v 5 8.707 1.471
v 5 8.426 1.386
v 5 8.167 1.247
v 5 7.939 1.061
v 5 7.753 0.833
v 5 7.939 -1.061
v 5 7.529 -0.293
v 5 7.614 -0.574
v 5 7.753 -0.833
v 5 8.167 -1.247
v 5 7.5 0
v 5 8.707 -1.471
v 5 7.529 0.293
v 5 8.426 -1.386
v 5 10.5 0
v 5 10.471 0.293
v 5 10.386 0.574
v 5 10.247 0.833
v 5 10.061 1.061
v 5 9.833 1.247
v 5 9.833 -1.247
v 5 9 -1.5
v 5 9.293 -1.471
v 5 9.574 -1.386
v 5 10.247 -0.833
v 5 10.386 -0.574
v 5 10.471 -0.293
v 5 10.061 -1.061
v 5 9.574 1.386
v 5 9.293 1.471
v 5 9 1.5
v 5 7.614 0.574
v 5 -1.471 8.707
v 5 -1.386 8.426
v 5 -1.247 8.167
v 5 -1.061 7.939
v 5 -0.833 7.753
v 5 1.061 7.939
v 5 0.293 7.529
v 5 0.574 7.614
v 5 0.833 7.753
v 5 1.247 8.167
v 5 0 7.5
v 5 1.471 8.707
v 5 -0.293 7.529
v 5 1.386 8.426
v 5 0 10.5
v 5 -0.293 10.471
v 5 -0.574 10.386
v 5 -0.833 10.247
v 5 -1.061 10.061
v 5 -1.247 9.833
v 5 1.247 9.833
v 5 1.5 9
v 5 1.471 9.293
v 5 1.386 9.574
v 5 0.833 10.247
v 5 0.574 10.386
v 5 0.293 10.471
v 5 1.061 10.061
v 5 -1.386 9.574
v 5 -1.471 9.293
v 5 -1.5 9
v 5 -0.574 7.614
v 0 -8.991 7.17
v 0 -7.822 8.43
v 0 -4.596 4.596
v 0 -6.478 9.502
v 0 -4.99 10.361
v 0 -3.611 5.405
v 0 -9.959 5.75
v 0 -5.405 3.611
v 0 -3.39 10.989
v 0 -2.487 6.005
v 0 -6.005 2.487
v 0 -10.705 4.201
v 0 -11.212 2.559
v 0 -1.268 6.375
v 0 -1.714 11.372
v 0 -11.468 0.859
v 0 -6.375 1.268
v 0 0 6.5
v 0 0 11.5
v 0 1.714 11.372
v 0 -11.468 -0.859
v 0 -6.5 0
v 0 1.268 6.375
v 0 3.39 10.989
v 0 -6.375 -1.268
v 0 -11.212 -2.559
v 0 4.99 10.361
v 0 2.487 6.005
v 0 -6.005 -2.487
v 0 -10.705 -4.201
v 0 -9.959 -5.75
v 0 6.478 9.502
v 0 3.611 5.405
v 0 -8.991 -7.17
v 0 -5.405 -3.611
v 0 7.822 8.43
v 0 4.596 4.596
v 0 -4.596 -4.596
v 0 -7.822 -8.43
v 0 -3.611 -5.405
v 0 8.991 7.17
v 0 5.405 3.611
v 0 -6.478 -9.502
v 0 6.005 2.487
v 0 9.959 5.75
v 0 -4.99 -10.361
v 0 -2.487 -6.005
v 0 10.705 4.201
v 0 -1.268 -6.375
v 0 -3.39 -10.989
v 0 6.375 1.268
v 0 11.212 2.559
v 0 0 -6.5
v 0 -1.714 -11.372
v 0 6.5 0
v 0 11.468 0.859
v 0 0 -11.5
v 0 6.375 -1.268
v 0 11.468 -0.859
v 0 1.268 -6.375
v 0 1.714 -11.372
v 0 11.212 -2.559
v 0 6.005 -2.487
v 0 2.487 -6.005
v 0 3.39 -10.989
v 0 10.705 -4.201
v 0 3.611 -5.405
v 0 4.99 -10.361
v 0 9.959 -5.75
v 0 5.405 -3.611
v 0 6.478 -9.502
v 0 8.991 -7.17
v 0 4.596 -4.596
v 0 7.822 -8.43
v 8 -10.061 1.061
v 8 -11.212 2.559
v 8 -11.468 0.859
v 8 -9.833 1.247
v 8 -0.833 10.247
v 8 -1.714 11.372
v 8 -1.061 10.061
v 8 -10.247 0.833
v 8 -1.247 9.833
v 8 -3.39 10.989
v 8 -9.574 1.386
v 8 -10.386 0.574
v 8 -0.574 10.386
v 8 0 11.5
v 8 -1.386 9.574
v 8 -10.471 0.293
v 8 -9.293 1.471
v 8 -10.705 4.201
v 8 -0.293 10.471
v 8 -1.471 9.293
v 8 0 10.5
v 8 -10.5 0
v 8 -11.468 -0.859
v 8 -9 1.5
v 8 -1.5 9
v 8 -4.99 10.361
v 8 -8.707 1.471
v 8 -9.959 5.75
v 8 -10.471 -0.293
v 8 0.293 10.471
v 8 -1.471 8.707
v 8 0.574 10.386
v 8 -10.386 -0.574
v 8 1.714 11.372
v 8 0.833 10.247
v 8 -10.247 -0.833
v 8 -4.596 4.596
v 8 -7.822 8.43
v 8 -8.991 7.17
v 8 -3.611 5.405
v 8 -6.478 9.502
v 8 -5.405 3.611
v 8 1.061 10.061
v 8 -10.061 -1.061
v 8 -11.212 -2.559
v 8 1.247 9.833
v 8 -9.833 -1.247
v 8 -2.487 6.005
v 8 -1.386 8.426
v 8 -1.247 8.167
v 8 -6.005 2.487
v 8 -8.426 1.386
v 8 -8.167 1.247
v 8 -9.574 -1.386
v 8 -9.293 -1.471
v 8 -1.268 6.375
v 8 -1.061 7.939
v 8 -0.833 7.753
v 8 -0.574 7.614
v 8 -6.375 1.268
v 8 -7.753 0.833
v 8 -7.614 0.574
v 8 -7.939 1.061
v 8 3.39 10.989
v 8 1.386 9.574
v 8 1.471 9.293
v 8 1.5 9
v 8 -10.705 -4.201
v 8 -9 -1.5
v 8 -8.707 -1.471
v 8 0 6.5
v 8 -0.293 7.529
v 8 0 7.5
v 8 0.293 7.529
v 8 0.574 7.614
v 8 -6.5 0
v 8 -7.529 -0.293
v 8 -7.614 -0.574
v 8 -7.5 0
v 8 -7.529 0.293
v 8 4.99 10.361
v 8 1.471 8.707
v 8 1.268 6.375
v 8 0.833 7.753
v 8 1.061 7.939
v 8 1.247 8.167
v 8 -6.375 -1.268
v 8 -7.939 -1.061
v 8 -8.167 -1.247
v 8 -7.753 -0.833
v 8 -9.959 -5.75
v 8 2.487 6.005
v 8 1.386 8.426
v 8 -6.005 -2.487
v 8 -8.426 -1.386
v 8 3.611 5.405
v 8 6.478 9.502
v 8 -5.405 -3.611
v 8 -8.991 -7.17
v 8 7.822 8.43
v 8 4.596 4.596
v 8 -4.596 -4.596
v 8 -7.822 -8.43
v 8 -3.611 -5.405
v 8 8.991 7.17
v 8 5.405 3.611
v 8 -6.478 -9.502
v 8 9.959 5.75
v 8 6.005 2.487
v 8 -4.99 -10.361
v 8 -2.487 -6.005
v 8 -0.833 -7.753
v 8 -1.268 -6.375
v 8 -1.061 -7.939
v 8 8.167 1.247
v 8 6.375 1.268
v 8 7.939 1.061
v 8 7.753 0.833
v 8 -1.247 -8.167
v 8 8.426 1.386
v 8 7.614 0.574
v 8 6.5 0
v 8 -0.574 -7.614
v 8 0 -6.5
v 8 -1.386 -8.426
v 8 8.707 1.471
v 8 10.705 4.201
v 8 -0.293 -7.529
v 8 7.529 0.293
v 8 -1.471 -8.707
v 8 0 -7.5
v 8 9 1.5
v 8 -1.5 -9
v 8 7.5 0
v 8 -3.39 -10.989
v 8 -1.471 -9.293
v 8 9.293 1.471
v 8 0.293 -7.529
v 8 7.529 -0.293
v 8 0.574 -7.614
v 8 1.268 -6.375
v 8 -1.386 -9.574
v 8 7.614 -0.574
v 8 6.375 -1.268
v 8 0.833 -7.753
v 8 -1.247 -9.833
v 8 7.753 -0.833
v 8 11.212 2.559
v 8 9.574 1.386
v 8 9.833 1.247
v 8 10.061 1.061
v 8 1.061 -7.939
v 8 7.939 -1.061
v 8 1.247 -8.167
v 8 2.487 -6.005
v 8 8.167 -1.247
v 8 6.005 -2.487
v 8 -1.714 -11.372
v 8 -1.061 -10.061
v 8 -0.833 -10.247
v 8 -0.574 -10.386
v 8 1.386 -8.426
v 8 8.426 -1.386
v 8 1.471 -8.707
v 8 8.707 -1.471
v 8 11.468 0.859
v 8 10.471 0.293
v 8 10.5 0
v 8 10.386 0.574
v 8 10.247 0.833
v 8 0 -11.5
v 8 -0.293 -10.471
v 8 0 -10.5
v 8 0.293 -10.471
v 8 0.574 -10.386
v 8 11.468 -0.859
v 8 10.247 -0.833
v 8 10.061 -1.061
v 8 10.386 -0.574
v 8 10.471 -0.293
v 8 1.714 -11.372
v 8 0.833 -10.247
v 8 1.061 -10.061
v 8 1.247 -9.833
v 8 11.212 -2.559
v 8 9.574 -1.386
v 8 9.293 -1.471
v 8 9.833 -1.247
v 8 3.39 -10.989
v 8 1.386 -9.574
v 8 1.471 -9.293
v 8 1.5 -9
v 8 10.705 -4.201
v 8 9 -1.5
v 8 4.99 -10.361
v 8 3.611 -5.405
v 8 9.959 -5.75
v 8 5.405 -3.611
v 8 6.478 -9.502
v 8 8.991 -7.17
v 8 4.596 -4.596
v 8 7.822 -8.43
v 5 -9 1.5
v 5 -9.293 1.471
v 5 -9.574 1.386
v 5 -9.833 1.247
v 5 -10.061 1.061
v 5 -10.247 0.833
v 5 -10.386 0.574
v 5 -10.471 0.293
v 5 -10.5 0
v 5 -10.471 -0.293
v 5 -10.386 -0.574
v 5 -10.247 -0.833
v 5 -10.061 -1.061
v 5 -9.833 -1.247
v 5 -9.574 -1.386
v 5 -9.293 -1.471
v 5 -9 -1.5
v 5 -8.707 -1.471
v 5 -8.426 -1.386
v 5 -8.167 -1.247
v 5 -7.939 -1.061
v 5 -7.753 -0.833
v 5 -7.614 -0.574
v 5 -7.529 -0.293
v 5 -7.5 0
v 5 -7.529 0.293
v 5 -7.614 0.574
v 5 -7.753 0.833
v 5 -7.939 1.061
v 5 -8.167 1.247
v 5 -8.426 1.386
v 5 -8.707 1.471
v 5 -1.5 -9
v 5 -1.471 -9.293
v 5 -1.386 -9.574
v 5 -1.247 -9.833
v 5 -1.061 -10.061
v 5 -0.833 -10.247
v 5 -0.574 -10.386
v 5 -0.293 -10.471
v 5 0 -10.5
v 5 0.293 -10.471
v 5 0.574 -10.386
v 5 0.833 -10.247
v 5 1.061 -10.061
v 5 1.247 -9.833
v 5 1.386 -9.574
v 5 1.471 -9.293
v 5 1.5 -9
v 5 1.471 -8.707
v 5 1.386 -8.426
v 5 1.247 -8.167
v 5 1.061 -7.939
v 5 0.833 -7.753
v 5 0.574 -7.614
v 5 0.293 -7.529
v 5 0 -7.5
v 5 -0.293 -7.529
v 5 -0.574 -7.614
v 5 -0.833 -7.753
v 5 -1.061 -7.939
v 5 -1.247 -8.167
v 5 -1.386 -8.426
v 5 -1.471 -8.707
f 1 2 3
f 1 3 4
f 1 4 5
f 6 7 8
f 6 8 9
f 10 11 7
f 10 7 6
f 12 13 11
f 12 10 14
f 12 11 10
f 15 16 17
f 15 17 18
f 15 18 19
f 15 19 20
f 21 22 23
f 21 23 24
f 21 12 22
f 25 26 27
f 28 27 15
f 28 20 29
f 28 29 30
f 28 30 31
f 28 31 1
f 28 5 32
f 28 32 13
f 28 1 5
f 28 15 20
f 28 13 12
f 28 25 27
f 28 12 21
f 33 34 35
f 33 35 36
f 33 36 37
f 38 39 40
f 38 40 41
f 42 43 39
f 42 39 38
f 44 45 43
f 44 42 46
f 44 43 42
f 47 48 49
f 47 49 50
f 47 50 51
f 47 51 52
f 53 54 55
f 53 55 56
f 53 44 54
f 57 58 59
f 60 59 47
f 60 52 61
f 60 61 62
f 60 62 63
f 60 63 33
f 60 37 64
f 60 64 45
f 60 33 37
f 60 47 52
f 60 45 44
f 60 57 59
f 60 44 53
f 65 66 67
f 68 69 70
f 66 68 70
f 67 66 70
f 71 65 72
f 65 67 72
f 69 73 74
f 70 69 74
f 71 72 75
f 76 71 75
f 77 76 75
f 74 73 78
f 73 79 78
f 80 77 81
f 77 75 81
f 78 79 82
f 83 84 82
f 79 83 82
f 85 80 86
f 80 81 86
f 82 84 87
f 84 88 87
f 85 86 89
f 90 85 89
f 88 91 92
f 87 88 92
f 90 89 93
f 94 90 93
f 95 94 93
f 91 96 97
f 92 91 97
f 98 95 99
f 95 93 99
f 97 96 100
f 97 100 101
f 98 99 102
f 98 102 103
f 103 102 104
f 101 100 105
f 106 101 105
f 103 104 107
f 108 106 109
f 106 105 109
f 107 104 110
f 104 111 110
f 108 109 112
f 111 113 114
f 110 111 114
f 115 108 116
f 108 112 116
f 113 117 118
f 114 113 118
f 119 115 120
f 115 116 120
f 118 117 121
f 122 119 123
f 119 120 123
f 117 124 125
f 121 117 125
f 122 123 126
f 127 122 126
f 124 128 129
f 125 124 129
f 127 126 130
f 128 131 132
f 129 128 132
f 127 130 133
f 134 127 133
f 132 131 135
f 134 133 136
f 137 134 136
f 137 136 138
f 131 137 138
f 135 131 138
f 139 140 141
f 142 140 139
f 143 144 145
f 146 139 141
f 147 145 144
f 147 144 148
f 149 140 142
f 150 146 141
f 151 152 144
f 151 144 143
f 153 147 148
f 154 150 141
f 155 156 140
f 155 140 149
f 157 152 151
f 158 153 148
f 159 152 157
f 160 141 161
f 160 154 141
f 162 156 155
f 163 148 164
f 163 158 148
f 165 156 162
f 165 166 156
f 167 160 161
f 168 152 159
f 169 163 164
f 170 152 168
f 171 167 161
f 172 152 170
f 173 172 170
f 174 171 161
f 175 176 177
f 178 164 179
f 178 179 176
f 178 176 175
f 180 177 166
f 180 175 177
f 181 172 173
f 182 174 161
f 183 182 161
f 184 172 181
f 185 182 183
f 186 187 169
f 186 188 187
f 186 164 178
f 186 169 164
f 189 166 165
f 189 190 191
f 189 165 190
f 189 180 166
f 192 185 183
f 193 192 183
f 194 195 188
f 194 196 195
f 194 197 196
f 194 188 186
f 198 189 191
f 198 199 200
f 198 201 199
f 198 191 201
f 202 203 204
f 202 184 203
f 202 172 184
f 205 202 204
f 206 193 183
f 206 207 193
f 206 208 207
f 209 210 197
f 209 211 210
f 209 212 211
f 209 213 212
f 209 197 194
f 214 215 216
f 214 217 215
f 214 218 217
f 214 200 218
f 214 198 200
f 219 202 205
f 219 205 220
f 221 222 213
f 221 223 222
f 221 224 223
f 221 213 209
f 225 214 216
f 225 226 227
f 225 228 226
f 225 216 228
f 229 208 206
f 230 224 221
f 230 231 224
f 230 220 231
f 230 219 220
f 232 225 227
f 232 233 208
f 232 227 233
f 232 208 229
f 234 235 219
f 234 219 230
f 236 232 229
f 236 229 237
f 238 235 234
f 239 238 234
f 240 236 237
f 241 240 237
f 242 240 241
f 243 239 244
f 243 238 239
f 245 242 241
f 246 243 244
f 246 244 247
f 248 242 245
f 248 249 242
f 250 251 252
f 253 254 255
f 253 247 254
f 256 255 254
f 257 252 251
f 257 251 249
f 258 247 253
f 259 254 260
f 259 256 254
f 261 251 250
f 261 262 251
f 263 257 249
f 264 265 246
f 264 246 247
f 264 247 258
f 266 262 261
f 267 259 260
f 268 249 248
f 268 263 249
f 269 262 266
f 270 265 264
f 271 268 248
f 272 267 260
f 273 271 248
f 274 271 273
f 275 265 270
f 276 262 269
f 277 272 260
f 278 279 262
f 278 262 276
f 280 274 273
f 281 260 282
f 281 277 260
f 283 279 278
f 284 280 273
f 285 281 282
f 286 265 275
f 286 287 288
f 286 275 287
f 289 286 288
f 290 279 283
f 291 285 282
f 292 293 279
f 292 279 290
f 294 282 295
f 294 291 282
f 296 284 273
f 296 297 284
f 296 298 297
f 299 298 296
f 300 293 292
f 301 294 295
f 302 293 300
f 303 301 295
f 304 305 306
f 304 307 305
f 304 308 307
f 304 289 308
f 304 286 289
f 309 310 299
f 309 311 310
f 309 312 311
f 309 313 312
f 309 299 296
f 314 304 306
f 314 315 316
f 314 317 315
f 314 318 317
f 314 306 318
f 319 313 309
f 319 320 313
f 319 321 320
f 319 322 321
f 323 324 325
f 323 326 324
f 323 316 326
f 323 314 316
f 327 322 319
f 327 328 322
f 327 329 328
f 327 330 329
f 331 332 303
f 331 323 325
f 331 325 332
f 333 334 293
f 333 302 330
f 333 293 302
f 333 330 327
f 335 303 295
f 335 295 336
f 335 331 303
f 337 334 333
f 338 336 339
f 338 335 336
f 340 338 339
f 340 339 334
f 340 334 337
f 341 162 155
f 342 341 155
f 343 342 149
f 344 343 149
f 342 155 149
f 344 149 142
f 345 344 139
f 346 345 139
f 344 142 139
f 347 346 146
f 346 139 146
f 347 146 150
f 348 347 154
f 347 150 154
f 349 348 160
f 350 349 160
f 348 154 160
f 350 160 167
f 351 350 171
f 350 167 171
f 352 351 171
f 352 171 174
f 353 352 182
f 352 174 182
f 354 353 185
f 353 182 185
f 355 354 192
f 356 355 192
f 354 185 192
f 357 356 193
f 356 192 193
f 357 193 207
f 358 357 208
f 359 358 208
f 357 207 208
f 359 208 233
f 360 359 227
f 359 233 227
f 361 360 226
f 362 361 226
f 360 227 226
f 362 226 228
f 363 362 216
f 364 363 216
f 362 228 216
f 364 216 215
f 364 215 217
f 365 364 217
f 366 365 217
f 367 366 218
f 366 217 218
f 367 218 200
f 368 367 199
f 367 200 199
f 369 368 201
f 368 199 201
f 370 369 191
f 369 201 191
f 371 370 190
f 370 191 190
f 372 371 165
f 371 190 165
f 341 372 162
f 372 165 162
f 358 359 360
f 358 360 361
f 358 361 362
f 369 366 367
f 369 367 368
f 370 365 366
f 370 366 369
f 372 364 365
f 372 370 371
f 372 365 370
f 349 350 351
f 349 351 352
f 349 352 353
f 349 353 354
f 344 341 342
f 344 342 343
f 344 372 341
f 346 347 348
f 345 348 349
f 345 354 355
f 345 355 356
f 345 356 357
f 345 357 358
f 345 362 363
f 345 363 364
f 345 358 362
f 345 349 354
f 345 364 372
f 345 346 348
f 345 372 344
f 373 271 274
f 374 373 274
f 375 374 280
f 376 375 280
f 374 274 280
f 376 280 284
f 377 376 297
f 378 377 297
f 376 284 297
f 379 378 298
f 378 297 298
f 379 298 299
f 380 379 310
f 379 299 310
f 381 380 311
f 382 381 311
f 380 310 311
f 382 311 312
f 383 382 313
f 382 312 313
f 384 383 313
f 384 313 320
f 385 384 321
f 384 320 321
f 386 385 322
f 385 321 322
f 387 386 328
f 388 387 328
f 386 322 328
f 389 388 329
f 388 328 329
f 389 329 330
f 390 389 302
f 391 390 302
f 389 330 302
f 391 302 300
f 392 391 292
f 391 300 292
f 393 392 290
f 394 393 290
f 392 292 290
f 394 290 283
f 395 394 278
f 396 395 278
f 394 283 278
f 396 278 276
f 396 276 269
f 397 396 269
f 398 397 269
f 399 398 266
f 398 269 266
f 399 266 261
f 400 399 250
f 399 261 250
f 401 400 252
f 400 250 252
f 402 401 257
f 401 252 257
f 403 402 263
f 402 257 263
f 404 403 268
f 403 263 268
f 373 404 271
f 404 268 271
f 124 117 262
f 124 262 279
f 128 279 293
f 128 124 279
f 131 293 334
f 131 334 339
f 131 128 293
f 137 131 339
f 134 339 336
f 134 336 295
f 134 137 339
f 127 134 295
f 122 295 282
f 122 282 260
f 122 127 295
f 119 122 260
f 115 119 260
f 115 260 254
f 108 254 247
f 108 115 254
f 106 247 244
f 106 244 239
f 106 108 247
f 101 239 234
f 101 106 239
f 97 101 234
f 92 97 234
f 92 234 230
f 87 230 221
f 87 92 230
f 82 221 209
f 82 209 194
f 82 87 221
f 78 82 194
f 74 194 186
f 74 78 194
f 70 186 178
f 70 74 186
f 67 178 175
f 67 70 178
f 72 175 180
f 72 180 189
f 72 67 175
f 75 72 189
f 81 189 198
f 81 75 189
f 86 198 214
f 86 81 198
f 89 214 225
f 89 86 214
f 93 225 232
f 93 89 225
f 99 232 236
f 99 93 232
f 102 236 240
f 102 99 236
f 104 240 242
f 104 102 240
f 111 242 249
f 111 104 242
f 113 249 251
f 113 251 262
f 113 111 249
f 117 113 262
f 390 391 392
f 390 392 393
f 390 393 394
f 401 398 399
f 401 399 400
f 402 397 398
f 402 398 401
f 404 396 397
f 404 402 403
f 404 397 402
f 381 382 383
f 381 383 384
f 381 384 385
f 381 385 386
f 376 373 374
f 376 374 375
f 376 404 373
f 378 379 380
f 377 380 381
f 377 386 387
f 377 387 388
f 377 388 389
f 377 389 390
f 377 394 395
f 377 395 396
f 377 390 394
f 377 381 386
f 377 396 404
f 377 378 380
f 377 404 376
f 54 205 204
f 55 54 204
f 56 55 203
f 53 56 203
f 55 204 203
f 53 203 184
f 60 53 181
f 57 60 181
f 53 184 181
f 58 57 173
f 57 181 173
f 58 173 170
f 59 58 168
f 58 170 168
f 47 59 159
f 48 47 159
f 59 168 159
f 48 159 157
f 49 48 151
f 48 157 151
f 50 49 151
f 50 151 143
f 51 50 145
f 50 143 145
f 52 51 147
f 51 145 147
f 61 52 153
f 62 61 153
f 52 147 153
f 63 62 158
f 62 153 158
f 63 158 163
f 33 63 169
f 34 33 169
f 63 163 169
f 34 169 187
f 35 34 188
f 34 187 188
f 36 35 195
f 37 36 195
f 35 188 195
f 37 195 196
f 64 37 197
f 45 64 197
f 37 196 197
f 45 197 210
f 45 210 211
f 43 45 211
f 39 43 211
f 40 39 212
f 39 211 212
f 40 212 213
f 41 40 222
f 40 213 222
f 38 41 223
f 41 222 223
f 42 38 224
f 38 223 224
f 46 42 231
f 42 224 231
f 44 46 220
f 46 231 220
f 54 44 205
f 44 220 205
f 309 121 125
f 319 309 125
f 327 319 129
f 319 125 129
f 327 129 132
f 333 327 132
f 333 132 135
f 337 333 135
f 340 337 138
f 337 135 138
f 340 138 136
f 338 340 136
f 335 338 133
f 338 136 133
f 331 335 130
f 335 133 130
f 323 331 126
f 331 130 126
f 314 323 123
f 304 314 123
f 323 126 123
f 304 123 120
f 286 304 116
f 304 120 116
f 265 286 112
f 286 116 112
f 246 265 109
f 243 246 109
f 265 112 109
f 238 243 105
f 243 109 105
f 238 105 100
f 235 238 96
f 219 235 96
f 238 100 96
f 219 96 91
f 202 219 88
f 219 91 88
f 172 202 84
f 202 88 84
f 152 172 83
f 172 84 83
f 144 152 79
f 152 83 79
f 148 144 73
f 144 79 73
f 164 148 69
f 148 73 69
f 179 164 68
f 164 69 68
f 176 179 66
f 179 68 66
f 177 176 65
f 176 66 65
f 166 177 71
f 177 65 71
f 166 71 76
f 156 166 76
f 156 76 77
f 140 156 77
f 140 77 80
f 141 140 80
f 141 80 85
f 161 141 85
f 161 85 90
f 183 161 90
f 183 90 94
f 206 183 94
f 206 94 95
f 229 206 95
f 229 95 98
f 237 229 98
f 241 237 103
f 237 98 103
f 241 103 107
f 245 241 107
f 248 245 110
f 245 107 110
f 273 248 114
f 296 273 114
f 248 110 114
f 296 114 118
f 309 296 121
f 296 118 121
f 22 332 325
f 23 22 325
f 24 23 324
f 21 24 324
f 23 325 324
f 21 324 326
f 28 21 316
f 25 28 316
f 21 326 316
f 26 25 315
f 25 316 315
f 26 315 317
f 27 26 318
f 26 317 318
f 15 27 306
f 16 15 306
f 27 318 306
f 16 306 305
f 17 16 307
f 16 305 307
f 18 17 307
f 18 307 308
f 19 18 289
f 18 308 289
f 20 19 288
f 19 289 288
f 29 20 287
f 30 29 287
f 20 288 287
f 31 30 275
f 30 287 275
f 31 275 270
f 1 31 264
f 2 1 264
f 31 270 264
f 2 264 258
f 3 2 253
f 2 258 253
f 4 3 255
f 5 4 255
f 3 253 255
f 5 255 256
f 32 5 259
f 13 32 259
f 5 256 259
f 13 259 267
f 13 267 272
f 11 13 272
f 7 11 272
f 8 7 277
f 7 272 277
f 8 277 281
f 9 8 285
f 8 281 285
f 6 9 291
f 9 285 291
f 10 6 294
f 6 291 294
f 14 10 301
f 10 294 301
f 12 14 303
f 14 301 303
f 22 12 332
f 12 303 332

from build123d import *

# Parameters (mm, degrees)
SKETCH_1_R               = 11.5
SKETCH_1_R_2             = 6.5
EXTRUDE_1_DEPTH          = 8
SKETCH_2_R               = 1.5
CUT_EXTRUDE_2_DEPTH      = 3
PATTERN_CIRCULAR_1_COUNT = 4


with BuildPart() as part:
    # 草图1 → 拉伸1 (new body)
    with BuildSketch(Plane(origin=(0, 0, 0), x_dir=(0, 0, -1), z_dir=(1, 0, 0))):
        Circle(SKETCH_1_R)
        Circle(SKETCH_1_R_2, mode=Mode.SUBTRACT)
    extrude(amount=EXTRUDE_1_DEPTH)

    # 草图2 → 拉伸2 (cut)
    with BuildSketch(Plane(origin=(8, 0, 0), x_dir=(0, 0, -1), z_dir=(1, 0, 0))):
        with Locations((0, 9)):
            Circle(SKETCH_2_R)
    cut_extrude_2 = extrude(amount=-CUT_EXTRUDE_2_DEPTH, mode=Mode.SUBTRACT)

    # 阵列(圆周)1: 拉伸2 ×4 about axis
    pattern_circular_1_axis = Axis((0, 0, 0), (1, 0, 0))
    for i in range(1, PATTERN_CIRCULAR_1_COUNT):
        add(cut_extrude_2.rotate(pattern_circular_1_axis, i * 360 / PATTERN_CIRCULAR_1_COUNT), mode=Mode.SUBTRACT)


solid = part.part
